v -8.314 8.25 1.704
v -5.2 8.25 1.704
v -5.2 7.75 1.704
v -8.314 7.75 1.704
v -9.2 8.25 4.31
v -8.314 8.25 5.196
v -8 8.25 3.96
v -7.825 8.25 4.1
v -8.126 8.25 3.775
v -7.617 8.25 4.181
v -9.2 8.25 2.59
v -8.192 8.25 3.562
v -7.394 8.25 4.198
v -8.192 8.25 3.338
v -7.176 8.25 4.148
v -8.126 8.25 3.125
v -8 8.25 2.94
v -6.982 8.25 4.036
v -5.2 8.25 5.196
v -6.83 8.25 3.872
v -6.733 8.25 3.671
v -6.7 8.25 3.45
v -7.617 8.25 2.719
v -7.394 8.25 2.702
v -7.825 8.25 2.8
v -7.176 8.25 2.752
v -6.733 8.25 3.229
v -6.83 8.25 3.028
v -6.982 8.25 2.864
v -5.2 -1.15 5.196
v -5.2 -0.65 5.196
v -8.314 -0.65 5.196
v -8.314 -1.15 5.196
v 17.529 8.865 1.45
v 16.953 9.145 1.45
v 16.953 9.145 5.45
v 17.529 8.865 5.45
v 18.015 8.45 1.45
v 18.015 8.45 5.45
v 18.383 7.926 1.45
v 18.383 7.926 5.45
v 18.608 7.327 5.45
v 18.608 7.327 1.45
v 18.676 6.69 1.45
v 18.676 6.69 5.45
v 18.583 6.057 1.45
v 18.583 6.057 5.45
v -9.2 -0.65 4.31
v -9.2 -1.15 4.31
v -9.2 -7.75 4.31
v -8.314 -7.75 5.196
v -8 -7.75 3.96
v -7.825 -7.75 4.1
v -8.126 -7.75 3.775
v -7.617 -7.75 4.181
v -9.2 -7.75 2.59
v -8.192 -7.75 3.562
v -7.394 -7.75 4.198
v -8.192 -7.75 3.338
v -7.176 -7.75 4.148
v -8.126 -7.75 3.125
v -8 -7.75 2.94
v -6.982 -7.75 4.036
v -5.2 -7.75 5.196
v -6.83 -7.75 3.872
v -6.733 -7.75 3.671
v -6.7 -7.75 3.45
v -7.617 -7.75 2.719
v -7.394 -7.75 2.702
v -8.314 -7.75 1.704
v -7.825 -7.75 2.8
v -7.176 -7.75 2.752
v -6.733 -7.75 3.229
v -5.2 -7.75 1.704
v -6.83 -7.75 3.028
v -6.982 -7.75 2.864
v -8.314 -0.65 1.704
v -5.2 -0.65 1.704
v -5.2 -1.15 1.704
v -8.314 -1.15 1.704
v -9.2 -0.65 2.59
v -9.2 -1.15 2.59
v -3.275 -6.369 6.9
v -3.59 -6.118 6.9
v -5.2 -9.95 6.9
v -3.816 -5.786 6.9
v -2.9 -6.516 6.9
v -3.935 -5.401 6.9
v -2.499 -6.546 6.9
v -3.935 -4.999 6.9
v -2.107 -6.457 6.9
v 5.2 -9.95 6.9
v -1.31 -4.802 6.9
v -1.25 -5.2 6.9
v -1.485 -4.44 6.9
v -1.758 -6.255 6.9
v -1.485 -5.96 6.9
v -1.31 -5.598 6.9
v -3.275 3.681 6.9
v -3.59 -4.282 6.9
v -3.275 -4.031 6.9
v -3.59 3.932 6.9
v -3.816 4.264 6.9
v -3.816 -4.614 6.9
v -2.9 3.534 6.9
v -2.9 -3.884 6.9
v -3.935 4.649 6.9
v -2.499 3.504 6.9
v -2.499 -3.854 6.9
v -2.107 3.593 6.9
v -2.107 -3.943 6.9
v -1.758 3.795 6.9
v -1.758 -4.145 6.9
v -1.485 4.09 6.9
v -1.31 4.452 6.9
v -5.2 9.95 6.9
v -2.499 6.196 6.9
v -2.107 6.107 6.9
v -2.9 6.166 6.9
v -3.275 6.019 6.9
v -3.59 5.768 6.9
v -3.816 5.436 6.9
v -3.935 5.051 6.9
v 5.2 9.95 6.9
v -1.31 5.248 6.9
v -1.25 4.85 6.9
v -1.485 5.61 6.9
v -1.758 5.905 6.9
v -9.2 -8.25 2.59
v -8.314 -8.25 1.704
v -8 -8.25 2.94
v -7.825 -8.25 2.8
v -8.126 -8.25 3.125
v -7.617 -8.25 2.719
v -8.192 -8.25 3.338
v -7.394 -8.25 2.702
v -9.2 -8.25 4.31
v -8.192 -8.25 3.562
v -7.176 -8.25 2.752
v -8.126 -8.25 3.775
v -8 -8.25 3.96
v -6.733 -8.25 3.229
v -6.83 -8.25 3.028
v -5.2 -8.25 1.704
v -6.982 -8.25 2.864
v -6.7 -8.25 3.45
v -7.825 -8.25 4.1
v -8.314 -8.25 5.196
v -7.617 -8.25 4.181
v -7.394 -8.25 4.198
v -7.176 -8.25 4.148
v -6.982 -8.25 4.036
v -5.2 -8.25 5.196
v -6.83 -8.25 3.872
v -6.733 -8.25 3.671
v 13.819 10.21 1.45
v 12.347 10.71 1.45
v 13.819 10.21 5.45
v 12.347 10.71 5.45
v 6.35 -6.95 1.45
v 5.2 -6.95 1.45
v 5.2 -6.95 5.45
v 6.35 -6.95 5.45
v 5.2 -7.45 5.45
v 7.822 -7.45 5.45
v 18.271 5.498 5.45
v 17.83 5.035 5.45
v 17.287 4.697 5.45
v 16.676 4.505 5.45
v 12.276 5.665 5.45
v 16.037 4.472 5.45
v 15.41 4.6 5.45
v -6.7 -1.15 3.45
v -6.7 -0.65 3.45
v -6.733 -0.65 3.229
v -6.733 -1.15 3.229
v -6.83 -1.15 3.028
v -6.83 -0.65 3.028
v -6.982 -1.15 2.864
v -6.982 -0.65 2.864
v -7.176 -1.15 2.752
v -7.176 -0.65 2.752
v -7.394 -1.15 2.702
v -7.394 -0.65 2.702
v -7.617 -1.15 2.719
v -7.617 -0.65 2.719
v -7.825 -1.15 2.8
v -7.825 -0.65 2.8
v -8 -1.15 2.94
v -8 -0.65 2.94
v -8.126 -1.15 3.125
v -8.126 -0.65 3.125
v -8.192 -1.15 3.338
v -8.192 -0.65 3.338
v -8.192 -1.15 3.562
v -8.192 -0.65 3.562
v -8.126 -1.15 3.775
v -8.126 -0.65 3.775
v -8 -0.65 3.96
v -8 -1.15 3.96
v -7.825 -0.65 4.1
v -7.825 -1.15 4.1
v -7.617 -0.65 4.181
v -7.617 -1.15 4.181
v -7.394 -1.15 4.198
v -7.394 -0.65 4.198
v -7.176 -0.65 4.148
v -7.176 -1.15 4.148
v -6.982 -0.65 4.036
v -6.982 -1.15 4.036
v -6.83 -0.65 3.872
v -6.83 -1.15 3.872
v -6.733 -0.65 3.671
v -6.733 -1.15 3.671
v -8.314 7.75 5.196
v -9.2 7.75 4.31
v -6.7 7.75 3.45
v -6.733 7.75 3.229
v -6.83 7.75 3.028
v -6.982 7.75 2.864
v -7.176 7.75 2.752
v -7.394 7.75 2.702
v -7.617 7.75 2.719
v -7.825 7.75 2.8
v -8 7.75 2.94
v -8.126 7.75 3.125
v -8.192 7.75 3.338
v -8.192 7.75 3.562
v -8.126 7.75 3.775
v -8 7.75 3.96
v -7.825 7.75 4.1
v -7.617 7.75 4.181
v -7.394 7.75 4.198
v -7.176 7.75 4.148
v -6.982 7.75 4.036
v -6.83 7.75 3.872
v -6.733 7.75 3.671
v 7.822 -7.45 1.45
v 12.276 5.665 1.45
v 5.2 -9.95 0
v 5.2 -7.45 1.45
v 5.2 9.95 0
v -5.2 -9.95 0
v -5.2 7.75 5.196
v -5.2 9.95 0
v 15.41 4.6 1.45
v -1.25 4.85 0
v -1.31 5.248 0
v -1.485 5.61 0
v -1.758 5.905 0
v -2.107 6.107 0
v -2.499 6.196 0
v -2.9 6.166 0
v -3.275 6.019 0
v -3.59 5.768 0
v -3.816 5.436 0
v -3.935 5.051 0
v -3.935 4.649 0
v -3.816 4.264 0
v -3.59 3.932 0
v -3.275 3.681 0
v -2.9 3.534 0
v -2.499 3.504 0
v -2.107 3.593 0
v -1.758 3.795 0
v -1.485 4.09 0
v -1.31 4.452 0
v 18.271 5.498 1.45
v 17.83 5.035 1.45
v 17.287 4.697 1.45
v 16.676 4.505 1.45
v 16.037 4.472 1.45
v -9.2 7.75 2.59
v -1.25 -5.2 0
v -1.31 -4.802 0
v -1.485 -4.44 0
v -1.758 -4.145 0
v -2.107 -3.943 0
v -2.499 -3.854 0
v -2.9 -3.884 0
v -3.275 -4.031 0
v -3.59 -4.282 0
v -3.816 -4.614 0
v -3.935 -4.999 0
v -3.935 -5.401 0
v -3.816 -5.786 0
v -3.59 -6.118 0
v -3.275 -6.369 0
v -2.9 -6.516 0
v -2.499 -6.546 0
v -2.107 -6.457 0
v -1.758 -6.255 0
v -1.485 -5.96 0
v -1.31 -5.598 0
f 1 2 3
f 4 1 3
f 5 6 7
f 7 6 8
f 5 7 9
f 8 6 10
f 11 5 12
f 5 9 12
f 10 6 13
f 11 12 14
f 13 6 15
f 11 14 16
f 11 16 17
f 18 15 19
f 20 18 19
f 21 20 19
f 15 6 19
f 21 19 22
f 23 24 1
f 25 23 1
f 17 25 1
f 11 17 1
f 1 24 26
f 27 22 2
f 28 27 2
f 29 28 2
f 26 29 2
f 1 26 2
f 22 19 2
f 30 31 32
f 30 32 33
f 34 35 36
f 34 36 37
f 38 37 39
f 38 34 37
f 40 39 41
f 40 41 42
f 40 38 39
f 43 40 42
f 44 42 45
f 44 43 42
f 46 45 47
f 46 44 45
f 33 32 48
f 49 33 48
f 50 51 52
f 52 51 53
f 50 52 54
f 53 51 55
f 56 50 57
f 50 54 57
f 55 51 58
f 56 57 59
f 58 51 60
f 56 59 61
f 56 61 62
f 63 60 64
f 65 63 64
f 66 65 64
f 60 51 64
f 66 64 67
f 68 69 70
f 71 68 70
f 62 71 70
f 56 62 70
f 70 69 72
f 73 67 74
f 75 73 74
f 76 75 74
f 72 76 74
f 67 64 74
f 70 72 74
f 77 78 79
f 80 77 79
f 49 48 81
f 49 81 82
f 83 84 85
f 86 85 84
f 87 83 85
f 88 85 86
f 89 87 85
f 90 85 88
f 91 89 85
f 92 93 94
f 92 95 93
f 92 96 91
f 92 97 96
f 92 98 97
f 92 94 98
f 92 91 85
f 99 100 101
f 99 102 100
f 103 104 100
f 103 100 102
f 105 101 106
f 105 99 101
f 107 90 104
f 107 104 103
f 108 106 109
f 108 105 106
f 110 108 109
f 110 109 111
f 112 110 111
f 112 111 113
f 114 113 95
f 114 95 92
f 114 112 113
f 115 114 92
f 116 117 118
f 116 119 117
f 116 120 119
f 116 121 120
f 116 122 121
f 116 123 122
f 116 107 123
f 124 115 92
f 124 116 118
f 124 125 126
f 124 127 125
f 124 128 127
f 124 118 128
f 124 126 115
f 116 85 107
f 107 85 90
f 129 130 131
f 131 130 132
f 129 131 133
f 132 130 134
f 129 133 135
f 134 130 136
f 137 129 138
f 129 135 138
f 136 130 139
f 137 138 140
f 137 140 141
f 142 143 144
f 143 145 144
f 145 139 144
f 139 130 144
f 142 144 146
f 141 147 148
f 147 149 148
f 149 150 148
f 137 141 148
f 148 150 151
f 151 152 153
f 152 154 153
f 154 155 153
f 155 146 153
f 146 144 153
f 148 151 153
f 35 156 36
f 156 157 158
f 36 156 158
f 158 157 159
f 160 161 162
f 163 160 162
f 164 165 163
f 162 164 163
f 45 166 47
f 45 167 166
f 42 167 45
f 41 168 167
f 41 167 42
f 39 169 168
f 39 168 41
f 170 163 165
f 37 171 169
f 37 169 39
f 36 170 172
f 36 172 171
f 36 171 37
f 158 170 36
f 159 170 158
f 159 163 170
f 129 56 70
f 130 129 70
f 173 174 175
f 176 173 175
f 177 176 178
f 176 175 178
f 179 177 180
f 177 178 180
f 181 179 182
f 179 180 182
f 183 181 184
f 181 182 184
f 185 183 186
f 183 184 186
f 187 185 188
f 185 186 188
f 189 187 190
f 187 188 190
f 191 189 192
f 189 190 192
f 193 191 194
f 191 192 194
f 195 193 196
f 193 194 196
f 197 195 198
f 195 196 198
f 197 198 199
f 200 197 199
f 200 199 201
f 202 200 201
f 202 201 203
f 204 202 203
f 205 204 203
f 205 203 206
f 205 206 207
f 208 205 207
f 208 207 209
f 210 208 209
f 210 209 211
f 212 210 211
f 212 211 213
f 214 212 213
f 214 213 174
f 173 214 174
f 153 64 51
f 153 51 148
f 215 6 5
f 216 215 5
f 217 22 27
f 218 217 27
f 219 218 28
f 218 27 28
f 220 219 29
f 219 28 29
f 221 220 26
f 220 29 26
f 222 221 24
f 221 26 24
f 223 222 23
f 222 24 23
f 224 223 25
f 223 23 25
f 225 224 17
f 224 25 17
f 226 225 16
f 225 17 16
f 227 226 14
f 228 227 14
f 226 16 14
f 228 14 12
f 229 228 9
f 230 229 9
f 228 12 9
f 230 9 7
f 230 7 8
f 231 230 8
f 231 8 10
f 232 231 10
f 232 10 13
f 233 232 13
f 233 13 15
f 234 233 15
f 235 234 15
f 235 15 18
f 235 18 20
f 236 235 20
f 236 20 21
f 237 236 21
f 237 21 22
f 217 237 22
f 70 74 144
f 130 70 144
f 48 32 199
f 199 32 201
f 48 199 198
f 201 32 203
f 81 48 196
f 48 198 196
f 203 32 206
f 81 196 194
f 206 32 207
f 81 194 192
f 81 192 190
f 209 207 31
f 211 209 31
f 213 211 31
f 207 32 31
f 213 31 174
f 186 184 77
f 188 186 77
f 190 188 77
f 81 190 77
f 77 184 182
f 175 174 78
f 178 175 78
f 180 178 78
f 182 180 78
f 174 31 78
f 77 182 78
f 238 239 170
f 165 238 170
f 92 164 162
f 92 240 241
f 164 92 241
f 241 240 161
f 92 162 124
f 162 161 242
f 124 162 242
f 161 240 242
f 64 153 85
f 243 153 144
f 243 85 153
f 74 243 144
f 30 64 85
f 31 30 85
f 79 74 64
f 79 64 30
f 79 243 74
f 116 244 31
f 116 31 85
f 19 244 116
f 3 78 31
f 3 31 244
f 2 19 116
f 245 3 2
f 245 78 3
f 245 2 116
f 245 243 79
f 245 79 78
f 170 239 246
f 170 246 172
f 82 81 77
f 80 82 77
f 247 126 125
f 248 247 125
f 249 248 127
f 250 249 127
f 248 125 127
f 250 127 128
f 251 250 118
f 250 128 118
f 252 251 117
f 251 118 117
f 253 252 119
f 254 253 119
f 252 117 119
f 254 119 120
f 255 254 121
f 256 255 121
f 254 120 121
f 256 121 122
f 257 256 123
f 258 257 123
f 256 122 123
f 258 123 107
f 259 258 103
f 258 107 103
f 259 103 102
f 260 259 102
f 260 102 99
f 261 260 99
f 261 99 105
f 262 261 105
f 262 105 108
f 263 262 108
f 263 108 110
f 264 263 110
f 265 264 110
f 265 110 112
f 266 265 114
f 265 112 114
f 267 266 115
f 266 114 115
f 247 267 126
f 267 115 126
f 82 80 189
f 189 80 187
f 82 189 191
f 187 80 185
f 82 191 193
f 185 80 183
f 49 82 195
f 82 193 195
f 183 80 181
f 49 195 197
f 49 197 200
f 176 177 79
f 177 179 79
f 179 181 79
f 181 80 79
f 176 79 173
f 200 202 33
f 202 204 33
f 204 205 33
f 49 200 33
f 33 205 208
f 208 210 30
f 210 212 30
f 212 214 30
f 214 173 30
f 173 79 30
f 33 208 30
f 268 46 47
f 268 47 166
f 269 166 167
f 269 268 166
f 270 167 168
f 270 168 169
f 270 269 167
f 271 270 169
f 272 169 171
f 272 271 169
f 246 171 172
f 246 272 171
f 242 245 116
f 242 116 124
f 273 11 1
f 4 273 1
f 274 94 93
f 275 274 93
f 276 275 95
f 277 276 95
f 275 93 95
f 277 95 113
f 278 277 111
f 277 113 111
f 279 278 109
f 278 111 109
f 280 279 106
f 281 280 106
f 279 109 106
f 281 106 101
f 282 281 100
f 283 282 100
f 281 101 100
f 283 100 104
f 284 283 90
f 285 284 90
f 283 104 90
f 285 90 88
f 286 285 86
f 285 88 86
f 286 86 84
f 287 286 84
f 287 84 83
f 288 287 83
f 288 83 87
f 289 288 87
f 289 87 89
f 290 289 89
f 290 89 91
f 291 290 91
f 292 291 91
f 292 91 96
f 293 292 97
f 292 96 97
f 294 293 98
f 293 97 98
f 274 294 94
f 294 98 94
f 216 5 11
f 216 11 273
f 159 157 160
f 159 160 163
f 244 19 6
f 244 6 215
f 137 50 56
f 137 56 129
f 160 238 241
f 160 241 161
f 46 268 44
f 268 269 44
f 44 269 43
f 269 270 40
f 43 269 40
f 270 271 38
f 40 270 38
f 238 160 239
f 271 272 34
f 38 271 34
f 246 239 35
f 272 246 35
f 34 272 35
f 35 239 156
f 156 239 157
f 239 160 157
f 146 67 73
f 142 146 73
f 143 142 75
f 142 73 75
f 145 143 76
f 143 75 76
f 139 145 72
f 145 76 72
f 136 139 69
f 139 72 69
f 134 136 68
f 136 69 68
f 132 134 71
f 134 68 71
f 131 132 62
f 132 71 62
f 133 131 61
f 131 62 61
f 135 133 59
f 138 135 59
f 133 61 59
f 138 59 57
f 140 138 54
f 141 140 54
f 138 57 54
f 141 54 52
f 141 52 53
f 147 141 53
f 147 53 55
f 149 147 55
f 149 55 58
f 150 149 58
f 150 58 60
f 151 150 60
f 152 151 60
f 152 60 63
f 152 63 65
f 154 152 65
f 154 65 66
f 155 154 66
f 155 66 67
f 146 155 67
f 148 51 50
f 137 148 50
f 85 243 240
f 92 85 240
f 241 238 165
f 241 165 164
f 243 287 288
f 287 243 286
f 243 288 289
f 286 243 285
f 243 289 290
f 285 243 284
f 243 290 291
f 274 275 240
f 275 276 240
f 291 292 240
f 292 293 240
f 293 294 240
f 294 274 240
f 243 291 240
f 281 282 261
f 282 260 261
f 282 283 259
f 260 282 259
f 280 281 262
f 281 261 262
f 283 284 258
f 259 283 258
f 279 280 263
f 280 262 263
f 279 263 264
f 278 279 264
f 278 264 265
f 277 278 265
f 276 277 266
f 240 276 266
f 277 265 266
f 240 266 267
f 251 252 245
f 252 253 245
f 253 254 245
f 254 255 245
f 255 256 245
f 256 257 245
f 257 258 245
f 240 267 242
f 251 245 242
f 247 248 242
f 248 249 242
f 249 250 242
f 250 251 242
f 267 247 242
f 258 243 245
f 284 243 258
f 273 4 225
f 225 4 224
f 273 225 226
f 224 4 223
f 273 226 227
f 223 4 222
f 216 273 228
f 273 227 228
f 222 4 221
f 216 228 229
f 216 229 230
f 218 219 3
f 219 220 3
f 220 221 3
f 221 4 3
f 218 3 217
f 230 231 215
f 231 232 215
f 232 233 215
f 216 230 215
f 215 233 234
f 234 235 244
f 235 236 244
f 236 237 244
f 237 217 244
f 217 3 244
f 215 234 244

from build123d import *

# Parameters (mm, degrees)
F0_W         = 10.4
F0_H         = 19.9
F1_DEPTH     = 6.9
F2_R         = 1.35
F3_DEPTH     = 6.9
F4_W         = 0.5
F4_H         = 1.746198668
F5_DEPTH     = 4
F7_DEPTH     = 16.5
F8_W         = 0.5
F8_H         = 2
F9_DEPTH     = 1.15
F11_DEPTH    = 4
F12_W        = 1.55500961
F12_H        = 4
F13_DEPTH    = 18.65
F14_W        = 4.8
F14_H        = 4
F15_DEPTH    = 5.85
F16_T1_DEPTH = 16.7


# Not quite as in the source:
# - a fillet or chamfer that OpenCascade refuses, or shapes differently, is made with other operations: its cross-section is extruded or revolved along the edge and cut away or added


with BuildPart() as f1:
    # F0 (on Top) → F1 (new body)
    with BuildSketch(Plane.XY):
        Rectangle(F0_W, F0_H)
    extrude(amount=F1_DEPTH)

    # F2 (on face) → F3 (cut, through all)
    with BuildSketch(Plane.XY.offset(6.9)):
        with Locations((-2.6, 4.85)):
            Circle(F2_R)
        with Locations((-2.6, -5.2)):
            Circle(F2_R)
    extrude(amount=-F3_DEPTH, mode=Mode.SUBTRACT)

    # F4 (on face) → F5 (join)
    with BuildSketch(Plane(origin=(-5.2, 0, 0), x_dir=(0, -1, 0), z_dir=(-1, 0, 0))):
        with Locations((-8, 2.576900666)):
            Rectangle(F4_W, F4_H)
        with Locations((8, 4.323099334)):
            Rectangle(F4_W, F4_H)
        with Locations((8, 2.576900666)):
            Rectangle(F4_W, F4_H)
        with Locations((0.9, 4.323099334)):
            Rectangle(F4_W, F4_H)
        with Locations((0.9, 2.576900666)):
            Rectangle(F4_W, F4_H)
        with Locations((-8, 4.323099334)):
            Rectangle(F4_W, F4_H)
    extrude(amount=F5_DEPTH)

    # F6 (on face) → F7 (cut, through all)
    with BuildSketch(Plane(origin=(0, 8.25, 0), x_dir=(-1, 0, 0), z_dir=(0, 1, 0))):
        with BuildLine():
            Line((6.7, 3.45), (8.2, 3.45))
            ThreePointArc((8.2, 3.45), (7.45, 4.2), (6.7, 3.45))
        make_face()
        with BuildLine():
            ThreePointArc((6.7, 3.45), (7.45, 2.7), (8.2, 3.45))
            Line((8.2, 3.45), (6.7, 3.45))
        make_face()
        Polygon((9.2, 5.196198668), (8.3137443289, 5.196198668), (9.2, 4.3099429969), align=None)
        Polygon((9.2, 1.703801332), (9.2, 2.5900570031), (8.3137443289, 1.703801332), align=None)
    extrude(amount=-F7_DEPTH, mode=Mode.SUBTRACT)

    # F8 (on face) → F9 (join)
    with BuildSketch(Plane.YZ.offset(5.2)):
        with Locations((-7.2, 2.45)):
            Rectangle(F8_W, F8_H)
        with Locations((-7.2, 4.45)):
            Rectangle(F8_W, F8_H)
    extrude(amount=F9_DEPTH)

    # F10 (on face) → F11 (join, through all)
    with BuildSketch(Plane(origin=(0, 0, 1.45), x_dir=(1, 0, 0), z_dir=(0, 0, -1))):
        Polygon((6.35, 7.45), (6.35, 6.95), (7.8224316239, 7.45), align=None)
    extrude(amount=-F11_DEPTH)

    # F12 (on face) → F13 (join)
    with BuildSketch(Plane(origin=(-1.4595201755, -4.2980873242, 0), x_dir=(-0.946895514, 0.3215414212, 0), z_dir=(0.3215414212, 0.946895514, 0))):
        with Locations((-9.0250041964, 3.45)):
            Rectangle(F12_W, F12_H)
    extrude(amount=F13_DEPTH)

    # F14 (on face) → F15 (join)
    with BuildSketch(Plane(origin=(9.2819517994, -3.1519126758, 0), x_dir=(0.3215414212, 0.946895514, 0), z_dir=(0.946895514, -0.3215414212, 0))):
        with Locations((11.7108642024, 3.45)):
            Rectangle(F14_W, F14_H)
    extrude(amount=F15_DEPTH)

    # F16: fillet of radius 2.54 on 2 edges, made by hand

    # F16_s2 → F16_t1 (cut)
    with BuildSketch(Plane.XY.offset(-4.9)):
        with BuildLine():
            ThreePointArc((16.953403281, 9.145299232), (18.4148657814, 7.8633526103), (18.5418026766, 5.9234694165))
            Line((18.5418026766, 5.9234694165), (19.3585178865, 8.3285840221))
            Line((19.3585178865, 8.3285840221), (16.953403281, 9.145299232))
        make_face()
        with BuildLine():
            ThreePointArc((18.6318342746, 6.1886001604), (17.3498876529, 4.72713766), (15.4100044591, 4.6002007647))
            Line((15.4100044591, 4.6002007647), (17.8151190647, 3.7834855549))
            Line((17.8151190647, 3.7834855549), (18.6318342746, 6.1886001604))
        make_face()
    extrude(amount=F16_T1_DEPTH, mode=Mode.SUBTRACT)


solid = f1.part
